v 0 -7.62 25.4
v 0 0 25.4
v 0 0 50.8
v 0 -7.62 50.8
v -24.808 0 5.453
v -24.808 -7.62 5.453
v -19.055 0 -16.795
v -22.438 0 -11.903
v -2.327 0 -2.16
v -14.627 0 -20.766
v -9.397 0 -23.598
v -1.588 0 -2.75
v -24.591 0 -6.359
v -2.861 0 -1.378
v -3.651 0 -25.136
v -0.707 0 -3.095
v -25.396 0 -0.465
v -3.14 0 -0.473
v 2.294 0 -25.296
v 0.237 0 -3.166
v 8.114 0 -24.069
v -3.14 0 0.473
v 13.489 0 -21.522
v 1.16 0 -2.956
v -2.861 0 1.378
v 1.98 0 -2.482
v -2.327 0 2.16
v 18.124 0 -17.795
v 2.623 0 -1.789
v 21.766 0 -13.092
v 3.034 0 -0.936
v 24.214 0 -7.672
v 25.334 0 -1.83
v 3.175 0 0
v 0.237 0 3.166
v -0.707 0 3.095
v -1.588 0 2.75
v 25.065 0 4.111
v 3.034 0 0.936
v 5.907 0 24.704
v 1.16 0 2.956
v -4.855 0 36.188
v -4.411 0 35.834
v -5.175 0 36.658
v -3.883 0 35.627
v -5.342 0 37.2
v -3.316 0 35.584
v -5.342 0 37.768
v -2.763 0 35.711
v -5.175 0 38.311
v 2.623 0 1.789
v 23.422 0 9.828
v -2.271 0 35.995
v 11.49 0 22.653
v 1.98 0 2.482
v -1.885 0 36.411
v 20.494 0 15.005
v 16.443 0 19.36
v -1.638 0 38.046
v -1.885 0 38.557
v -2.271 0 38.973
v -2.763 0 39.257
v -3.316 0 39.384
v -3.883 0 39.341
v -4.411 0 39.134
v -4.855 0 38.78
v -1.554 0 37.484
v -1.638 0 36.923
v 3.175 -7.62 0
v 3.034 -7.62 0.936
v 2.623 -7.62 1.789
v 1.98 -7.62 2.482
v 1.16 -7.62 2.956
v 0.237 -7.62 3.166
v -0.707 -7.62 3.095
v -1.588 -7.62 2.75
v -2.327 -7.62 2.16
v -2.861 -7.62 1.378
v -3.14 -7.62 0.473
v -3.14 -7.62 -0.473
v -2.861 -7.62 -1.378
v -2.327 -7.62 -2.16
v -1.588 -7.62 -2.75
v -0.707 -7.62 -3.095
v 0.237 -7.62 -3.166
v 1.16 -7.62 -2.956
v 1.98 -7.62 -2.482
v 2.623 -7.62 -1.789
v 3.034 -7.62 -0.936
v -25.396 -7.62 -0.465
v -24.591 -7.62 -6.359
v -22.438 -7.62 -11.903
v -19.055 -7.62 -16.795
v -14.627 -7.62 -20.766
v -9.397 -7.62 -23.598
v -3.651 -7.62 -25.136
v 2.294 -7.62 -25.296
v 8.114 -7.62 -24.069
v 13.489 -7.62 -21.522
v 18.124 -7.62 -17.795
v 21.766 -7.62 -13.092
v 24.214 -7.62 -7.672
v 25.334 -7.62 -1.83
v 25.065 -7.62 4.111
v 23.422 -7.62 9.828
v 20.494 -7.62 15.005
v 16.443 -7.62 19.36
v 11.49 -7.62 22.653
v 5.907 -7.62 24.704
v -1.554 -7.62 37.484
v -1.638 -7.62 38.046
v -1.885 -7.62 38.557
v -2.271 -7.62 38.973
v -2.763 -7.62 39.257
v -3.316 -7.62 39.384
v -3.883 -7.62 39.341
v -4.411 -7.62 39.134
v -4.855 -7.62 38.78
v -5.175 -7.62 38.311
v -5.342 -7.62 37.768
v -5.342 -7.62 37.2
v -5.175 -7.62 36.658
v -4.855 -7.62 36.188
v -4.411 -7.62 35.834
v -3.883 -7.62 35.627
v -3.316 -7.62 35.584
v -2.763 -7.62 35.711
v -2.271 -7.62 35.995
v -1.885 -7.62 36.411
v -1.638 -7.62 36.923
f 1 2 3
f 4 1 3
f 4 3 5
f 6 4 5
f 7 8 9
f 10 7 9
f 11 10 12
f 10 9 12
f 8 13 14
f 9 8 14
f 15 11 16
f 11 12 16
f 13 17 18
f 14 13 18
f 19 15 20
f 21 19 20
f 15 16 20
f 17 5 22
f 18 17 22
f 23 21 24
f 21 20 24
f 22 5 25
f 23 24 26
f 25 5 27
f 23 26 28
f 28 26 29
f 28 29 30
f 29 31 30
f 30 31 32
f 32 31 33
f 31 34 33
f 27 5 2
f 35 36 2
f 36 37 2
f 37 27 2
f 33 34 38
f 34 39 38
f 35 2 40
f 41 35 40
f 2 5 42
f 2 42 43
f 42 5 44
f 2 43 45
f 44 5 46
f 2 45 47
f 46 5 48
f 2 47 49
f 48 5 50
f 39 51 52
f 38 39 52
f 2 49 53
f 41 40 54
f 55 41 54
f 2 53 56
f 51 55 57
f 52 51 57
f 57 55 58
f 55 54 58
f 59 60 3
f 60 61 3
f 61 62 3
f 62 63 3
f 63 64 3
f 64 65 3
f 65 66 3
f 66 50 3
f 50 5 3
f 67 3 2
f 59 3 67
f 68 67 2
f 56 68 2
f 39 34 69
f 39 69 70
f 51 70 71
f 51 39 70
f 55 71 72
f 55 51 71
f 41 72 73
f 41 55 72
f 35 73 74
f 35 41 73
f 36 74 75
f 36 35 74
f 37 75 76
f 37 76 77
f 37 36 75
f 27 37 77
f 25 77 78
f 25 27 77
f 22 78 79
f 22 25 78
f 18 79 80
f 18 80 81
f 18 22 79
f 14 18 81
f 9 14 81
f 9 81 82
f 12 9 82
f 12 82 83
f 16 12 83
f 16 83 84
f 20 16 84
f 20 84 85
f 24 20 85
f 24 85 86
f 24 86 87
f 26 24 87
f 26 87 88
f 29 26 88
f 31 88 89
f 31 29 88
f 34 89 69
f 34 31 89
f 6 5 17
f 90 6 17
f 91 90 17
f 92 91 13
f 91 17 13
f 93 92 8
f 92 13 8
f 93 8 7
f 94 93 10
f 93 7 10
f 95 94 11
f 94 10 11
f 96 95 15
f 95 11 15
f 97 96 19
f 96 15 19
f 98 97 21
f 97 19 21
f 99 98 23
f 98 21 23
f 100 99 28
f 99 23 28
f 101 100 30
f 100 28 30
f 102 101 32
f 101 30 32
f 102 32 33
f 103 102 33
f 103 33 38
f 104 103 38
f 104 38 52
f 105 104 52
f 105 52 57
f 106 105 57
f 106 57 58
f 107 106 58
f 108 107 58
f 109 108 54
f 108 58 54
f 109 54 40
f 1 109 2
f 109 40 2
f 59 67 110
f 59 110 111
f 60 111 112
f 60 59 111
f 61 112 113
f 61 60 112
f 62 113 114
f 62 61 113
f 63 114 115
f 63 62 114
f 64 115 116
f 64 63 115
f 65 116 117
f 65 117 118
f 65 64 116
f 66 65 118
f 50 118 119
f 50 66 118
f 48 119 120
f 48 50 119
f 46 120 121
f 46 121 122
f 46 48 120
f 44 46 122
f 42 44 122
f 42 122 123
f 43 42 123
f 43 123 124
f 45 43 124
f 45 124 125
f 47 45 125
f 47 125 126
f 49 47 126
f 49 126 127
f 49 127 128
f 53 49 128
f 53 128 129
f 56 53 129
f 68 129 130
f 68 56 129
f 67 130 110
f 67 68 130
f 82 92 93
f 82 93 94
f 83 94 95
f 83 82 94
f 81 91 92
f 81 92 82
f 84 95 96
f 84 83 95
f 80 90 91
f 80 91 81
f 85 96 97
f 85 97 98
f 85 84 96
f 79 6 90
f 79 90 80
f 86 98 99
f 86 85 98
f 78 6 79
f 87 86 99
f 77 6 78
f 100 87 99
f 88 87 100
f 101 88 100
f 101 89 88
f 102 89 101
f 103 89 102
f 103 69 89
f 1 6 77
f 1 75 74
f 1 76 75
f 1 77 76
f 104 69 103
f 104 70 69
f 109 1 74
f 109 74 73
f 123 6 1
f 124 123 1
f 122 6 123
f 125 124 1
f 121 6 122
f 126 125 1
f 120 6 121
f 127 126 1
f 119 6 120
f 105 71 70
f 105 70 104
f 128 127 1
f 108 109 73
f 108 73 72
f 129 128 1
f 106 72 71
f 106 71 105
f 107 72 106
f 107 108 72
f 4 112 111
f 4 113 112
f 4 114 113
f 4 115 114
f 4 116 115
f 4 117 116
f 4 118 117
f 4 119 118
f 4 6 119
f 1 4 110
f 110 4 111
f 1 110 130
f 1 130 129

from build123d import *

# Parameters (mm, degrees)
F0_R     = 3.175
F0_R_2   = 1.905
F1_DEPTH = 7.62


with BuildPart() as f1:
    # F0 (on Front) → F1 (new body)
    with BuildSketch(Plane.XZ):
        with BuildLine():
            Line((0, 50.8), (-24.807708, 5.453221))
            ThreePointArc((-24.807708, 5.453221), (15.916158, -19.794846), (0, 25.4))
            Line((0, 25.4), (0, 50.8))
        make_face()
        Circle(F0_R, mode=Mode.SUBTRACT)
        with Locations((-3.458634, 37.484073)):
            Circle(F0_R_2, mode=Mode.SUBTRACT)
    extrude(amount=F1_DEPTH)


solid = f1.part
